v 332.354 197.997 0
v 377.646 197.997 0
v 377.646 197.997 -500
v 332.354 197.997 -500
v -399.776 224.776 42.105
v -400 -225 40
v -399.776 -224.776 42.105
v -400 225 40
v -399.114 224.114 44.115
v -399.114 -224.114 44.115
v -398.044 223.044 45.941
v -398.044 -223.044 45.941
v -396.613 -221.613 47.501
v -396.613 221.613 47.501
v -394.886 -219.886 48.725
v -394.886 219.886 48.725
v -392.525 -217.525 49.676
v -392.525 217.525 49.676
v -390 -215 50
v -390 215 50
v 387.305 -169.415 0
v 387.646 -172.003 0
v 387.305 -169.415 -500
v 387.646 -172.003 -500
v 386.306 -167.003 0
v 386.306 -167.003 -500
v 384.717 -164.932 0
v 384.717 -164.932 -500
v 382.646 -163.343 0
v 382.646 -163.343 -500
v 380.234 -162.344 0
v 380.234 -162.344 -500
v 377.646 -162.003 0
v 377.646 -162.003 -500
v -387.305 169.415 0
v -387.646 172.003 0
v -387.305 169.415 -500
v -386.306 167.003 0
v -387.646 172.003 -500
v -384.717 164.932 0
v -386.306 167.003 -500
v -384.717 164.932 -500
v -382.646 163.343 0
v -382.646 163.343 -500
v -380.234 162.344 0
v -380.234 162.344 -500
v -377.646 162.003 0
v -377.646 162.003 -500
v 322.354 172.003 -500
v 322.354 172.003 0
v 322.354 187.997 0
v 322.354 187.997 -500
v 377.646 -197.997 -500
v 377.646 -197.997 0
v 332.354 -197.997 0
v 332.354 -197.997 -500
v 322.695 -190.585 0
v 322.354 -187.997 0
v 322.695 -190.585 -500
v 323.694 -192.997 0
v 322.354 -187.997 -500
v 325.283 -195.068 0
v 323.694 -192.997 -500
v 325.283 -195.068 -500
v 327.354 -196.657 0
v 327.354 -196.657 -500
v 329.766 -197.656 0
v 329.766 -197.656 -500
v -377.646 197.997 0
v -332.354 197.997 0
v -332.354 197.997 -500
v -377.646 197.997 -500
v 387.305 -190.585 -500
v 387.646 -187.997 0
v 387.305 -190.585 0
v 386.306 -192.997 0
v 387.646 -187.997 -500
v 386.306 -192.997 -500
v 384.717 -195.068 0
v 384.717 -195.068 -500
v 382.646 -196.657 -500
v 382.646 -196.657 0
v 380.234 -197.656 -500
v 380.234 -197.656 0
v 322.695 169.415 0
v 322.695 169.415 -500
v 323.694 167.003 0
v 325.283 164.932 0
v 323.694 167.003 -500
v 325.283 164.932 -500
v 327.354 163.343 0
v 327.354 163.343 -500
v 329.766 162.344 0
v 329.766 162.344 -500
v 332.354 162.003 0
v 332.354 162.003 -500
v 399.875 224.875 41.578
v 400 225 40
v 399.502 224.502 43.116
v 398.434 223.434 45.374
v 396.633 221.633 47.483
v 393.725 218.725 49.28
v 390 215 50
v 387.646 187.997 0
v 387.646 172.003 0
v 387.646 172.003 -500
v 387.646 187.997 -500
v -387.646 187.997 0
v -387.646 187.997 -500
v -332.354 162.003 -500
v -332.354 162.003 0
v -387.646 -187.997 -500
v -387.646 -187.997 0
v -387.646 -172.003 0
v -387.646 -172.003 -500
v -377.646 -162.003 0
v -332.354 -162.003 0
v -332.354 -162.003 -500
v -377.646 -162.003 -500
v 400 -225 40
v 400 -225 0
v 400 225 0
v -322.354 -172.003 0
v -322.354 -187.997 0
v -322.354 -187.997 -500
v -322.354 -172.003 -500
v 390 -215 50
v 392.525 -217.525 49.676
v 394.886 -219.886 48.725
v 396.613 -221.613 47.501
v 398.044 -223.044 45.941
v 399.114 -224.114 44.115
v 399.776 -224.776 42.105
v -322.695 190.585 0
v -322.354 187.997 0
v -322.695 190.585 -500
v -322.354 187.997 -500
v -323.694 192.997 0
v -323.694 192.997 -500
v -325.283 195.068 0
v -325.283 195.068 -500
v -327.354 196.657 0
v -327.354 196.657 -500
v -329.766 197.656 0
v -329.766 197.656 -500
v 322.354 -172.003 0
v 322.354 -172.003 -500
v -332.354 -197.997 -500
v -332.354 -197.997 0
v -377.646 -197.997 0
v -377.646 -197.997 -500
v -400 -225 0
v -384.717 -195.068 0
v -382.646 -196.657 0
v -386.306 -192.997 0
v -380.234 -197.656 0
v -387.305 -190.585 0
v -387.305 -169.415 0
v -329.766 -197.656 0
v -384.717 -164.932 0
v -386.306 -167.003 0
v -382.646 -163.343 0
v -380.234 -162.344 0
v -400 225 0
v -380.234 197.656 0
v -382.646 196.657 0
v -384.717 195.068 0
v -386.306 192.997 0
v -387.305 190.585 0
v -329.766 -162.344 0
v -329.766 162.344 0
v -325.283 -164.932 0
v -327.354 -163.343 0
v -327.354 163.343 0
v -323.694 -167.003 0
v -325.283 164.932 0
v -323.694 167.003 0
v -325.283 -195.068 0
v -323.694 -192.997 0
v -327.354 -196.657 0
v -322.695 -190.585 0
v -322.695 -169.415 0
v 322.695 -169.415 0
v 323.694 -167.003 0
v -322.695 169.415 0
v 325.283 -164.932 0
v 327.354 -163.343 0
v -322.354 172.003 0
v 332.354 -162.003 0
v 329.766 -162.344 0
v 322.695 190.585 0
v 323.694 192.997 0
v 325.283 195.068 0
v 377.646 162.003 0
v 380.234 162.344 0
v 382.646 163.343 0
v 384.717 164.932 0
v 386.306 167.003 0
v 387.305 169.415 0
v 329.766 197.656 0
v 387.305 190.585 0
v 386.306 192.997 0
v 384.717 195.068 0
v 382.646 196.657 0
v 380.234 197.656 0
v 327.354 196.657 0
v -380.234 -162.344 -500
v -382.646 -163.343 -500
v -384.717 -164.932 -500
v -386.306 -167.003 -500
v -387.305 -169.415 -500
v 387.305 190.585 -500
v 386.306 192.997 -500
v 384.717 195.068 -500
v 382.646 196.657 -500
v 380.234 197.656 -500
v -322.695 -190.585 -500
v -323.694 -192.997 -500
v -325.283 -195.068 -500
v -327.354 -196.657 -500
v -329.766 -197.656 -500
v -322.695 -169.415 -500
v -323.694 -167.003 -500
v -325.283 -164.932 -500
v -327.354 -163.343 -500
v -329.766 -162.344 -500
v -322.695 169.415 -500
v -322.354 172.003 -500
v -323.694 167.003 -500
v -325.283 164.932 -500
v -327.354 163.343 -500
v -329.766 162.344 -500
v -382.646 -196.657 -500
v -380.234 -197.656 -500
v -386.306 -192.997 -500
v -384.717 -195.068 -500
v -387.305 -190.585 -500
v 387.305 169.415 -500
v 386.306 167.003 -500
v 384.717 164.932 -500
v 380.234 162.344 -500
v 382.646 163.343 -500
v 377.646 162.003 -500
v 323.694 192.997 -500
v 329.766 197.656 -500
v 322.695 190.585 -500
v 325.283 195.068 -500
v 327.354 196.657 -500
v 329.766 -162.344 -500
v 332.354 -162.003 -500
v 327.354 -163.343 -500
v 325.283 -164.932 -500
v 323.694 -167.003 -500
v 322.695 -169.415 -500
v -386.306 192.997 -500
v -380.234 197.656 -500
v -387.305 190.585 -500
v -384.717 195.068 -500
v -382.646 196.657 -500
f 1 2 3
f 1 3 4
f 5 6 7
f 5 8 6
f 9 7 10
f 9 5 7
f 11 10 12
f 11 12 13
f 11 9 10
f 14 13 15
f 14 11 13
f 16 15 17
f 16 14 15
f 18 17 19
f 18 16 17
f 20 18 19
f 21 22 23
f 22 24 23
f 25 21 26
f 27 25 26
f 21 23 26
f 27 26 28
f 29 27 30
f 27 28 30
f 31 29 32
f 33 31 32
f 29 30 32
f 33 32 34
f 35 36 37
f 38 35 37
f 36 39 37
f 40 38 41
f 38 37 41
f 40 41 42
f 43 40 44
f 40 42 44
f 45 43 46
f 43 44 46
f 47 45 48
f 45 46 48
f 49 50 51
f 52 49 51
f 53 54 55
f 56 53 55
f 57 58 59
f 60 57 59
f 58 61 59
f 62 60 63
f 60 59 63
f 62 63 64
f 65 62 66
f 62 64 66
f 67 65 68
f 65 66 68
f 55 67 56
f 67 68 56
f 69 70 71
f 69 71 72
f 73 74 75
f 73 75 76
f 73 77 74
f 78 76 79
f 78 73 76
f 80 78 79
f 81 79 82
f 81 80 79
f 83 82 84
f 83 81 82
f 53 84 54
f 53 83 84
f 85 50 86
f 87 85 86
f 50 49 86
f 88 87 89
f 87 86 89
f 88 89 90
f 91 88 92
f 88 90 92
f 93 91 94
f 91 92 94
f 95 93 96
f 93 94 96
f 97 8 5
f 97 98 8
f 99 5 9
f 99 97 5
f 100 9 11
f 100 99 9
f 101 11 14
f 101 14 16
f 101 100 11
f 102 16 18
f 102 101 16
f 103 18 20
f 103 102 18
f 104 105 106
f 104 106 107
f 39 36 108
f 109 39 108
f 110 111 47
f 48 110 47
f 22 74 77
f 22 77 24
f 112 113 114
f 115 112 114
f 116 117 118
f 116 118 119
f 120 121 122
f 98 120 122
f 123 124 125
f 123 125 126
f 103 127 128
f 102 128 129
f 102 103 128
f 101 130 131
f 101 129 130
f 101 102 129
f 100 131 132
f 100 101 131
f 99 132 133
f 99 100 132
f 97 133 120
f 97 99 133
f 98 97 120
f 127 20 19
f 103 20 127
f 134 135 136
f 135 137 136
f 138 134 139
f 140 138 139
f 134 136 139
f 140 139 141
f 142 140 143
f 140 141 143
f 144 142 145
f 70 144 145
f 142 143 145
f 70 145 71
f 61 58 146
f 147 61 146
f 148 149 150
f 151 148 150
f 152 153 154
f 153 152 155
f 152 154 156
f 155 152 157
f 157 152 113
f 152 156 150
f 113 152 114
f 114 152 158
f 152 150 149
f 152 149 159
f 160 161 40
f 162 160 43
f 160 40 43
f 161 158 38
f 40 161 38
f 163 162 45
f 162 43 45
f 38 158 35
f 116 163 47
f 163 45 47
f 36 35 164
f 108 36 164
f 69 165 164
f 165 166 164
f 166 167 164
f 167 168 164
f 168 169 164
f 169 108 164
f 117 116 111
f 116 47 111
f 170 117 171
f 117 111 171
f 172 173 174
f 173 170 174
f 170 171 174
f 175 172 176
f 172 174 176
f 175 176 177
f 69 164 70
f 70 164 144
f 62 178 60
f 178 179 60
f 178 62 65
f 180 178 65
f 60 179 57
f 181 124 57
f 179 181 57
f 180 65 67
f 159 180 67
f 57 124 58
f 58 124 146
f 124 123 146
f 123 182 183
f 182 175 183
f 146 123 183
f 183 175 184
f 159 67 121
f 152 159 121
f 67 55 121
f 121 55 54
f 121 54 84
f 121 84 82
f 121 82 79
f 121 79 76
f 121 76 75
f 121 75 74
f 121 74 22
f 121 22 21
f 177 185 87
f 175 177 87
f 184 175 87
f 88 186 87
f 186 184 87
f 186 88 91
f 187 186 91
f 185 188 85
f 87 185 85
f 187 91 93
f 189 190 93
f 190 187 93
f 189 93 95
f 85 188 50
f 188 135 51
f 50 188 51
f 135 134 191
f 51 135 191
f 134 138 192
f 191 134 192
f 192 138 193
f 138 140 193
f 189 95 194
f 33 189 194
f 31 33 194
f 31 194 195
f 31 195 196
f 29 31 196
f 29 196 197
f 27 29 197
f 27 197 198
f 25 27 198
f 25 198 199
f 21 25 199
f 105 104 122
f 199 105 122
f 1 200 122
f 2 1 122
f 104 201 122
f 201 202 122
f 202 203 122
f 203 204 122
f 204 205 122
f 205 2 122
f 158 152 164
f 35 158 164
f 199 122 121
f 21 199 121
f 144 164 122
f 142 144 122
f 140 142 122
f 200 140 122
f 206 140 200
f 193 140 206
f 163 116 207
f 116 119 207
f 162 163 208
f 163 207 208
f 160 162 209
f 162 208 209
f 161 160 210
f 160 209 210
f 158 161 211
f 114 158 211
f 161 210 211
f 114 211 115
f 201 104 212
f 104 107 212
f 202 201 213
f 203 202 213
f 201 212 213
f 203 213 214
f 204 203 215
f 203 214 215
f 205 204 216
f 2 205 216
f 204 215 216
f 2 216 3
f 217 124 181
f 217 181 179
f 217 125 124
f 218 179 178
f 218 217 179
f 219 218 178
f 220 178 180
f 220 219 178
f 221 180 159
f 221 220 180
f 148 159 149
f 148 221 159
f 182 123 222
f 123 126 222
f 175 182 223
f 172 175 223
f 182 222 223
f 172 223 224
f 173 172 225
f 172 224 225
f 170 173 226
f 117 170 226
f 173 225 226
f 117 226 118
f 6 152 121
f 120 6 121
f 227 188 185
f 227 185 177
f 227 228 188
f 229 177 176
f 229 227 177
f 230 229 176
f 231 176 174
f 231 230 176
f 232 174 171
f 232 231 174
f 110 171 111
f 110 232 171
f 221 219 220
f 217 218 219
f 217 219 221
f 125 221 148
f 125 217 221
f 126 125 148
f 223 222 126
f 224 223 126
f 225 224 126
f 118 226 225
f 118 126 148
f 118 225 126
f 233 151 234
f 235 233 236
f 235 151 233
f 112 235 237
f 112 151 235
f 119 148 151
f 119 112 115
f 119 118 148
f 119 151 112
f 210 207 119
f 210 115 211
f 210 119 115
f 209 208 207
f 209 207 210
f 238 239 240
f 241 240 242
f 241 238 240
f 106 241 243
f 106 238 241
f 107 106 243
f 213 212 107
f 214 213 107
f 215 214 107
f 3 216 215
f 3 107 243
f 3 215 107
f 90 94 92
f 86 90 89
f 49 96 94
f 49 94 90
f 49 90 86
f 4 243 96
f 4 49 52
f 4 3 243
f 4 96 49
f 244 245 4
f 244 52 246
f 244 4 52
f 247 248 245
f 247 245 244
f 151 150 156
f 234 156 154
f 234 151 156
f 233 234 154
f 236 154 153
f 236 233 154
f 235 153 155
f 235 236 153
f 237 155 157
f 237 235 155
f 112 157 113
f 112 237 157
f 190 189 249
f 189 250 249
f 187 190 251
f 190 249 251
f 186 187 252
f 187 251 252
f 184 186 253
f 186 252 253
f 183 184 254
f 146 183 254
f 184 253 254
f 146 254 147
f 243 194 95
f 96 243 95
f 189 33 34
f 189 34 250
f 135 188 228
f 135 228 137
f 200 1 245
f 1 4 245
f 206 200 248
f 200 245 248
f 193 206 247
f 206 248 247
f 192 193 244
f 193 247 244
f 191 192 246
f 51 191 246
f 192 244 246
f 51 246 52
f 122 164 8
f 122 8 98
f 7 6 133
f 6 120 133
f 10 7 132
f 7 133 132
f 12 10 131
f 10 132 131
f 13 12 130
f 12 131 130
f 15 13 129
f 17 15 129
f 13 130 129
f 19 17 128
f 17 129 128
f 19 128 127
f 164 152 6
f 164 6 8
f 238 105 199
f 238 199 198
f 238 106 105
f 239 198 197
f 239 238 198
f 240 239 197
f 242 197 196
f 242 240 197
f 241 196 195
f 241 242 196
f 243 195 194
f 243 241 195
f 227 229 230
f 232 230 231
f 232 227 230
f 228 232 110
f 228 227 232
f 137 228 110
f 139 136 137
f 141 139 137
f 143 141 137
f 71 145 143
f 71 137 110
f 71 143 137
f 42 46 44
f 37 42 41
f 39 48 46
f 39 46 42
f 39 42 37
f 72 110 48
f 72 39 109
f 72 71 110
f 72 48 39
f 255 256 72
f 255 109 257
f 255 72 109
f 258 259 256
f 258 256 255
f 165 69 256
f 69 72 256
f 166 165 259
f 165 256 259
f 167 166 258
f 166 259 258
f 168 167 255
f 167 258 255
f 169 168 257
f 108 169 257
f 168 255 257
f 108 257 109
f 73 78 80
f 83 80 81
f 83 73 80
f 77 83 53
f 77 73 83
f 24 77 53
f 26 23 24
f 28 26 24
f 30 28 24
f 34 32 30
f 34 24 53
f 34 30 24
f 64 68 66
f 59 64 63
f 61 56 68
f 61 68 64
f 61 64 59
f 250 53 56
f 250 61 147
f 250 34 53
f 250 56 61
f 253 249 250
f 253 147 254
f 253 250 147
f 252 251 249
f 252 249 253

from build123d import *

# Parameters (mm, degrees)
SKETCH1_W            = 800
SKETCH1_H            = 450
TABLE_DEPTH          = 50
SKETCH2_W            = 65.292318294
SKETCH2_H            = 35.994240988
PIED_DEPTH           = 500
LPATTERN3_COUNT      = 2
LPATTERN3_PITCH      = 710
LPATTERN3_COUNT_DIR2 = 2
LPATTERN3_PITCH_DIR2 = 360
FILLET1_R            = 10
FILLET2_R            = 10
FILLET3_R            = 10
FILLET4_R            = 10
FILLET5_R            = 10


with BuildPart() as part:
    # Sketch1 → Table (new body)
    with BuildSketch(Plane.XY):
        Rectangle(SKETCH1_W, SKETCH1_H)
    extrude(amount=TABLE_DEPTH)

    # Sketch2 → pied (add)
    with BuildSketch(Plane(origin=(0, 0, 0), x_dir=(-1, 0, 0), z_dir=(0, 0, -1))):
        with Locations((355, -180)):
            Rectangle(SKETCH2_W, SKETCH2_H)
    pied = extrude(amount=PIED_DEPTH)

    # LPattern3: pied 2 × 2
    with Locations(*[(i * LPATTERN3_PITCH, j * LPATTERN3_PITCH_DIR2, 0) for i in range(LPATTERN3_COUNT) for j in range(LPATTERN3_COUNT_DIR2) if (i, j) != (0, 0)]):
        add(pied)

    # Fillet1
    fillet1_edges = [part.edges().sort_by_distance(p)[0] for p in [
        (-400, 0, 50),
        (0, -225, 50),
        (400, 0, 50),
        (0, 225, 50),
    ]]
    fillet(fillet1_edges, radius=FILLET1_R)

    # Fillet2
    fillet2_edges = [part.edges().sort_by_distance(p)[0] for p in [
        (-322.353840853, -162.002879506, -250),
        (-322.353840853, -197.997120494, -250),
        (-387.646159147, -197.997120494, -250),
        (-387.646159147, -162.002879506, -250),
    ]]
    fillet(fillet2_edges, radius=FILLET2_R)

    # Fillet3
    fillet3_edges = [part.edges().sort_by_distance(p)[0] for p in [
        (387.646159147, -162.002879506, -250),
        (387.646159147, -197.997120494, -250),
        (322.353840853, -197.997120494, -250),
        (322.353840853, -162.002879506, -250),
    ]]
    fillet(fillet3_edges, radius=FILLET3_R)

    # Fillet4
    fillet4_edges = [part.edges().sort_by_distance(p)[0] for p in [
        (387.646159147, 162.002879506, -250),
        (387.646159147, 197.997120494, -250),
        (322.353840853, 162.002879506, -250),
        (322.353840853, 197.997120494, -250),
    ]]
    fillet(fillet4_edges, radius=FILLET4_R)

    # Fillet5
    fillet5_edges = [part.edges().sort_by_distance(p)[0] for p in [
        (-322.353840853, 162.002879506, -250),
        (-322.353840853, 197.997120494, -250),
        (-387.646159147, 162.002879506, -250),
        (-387.646159147, 197.997120494, -250),
    ]]
    fillet(fillet5_edges, radius=FILLET5_R)


solid = part.part
